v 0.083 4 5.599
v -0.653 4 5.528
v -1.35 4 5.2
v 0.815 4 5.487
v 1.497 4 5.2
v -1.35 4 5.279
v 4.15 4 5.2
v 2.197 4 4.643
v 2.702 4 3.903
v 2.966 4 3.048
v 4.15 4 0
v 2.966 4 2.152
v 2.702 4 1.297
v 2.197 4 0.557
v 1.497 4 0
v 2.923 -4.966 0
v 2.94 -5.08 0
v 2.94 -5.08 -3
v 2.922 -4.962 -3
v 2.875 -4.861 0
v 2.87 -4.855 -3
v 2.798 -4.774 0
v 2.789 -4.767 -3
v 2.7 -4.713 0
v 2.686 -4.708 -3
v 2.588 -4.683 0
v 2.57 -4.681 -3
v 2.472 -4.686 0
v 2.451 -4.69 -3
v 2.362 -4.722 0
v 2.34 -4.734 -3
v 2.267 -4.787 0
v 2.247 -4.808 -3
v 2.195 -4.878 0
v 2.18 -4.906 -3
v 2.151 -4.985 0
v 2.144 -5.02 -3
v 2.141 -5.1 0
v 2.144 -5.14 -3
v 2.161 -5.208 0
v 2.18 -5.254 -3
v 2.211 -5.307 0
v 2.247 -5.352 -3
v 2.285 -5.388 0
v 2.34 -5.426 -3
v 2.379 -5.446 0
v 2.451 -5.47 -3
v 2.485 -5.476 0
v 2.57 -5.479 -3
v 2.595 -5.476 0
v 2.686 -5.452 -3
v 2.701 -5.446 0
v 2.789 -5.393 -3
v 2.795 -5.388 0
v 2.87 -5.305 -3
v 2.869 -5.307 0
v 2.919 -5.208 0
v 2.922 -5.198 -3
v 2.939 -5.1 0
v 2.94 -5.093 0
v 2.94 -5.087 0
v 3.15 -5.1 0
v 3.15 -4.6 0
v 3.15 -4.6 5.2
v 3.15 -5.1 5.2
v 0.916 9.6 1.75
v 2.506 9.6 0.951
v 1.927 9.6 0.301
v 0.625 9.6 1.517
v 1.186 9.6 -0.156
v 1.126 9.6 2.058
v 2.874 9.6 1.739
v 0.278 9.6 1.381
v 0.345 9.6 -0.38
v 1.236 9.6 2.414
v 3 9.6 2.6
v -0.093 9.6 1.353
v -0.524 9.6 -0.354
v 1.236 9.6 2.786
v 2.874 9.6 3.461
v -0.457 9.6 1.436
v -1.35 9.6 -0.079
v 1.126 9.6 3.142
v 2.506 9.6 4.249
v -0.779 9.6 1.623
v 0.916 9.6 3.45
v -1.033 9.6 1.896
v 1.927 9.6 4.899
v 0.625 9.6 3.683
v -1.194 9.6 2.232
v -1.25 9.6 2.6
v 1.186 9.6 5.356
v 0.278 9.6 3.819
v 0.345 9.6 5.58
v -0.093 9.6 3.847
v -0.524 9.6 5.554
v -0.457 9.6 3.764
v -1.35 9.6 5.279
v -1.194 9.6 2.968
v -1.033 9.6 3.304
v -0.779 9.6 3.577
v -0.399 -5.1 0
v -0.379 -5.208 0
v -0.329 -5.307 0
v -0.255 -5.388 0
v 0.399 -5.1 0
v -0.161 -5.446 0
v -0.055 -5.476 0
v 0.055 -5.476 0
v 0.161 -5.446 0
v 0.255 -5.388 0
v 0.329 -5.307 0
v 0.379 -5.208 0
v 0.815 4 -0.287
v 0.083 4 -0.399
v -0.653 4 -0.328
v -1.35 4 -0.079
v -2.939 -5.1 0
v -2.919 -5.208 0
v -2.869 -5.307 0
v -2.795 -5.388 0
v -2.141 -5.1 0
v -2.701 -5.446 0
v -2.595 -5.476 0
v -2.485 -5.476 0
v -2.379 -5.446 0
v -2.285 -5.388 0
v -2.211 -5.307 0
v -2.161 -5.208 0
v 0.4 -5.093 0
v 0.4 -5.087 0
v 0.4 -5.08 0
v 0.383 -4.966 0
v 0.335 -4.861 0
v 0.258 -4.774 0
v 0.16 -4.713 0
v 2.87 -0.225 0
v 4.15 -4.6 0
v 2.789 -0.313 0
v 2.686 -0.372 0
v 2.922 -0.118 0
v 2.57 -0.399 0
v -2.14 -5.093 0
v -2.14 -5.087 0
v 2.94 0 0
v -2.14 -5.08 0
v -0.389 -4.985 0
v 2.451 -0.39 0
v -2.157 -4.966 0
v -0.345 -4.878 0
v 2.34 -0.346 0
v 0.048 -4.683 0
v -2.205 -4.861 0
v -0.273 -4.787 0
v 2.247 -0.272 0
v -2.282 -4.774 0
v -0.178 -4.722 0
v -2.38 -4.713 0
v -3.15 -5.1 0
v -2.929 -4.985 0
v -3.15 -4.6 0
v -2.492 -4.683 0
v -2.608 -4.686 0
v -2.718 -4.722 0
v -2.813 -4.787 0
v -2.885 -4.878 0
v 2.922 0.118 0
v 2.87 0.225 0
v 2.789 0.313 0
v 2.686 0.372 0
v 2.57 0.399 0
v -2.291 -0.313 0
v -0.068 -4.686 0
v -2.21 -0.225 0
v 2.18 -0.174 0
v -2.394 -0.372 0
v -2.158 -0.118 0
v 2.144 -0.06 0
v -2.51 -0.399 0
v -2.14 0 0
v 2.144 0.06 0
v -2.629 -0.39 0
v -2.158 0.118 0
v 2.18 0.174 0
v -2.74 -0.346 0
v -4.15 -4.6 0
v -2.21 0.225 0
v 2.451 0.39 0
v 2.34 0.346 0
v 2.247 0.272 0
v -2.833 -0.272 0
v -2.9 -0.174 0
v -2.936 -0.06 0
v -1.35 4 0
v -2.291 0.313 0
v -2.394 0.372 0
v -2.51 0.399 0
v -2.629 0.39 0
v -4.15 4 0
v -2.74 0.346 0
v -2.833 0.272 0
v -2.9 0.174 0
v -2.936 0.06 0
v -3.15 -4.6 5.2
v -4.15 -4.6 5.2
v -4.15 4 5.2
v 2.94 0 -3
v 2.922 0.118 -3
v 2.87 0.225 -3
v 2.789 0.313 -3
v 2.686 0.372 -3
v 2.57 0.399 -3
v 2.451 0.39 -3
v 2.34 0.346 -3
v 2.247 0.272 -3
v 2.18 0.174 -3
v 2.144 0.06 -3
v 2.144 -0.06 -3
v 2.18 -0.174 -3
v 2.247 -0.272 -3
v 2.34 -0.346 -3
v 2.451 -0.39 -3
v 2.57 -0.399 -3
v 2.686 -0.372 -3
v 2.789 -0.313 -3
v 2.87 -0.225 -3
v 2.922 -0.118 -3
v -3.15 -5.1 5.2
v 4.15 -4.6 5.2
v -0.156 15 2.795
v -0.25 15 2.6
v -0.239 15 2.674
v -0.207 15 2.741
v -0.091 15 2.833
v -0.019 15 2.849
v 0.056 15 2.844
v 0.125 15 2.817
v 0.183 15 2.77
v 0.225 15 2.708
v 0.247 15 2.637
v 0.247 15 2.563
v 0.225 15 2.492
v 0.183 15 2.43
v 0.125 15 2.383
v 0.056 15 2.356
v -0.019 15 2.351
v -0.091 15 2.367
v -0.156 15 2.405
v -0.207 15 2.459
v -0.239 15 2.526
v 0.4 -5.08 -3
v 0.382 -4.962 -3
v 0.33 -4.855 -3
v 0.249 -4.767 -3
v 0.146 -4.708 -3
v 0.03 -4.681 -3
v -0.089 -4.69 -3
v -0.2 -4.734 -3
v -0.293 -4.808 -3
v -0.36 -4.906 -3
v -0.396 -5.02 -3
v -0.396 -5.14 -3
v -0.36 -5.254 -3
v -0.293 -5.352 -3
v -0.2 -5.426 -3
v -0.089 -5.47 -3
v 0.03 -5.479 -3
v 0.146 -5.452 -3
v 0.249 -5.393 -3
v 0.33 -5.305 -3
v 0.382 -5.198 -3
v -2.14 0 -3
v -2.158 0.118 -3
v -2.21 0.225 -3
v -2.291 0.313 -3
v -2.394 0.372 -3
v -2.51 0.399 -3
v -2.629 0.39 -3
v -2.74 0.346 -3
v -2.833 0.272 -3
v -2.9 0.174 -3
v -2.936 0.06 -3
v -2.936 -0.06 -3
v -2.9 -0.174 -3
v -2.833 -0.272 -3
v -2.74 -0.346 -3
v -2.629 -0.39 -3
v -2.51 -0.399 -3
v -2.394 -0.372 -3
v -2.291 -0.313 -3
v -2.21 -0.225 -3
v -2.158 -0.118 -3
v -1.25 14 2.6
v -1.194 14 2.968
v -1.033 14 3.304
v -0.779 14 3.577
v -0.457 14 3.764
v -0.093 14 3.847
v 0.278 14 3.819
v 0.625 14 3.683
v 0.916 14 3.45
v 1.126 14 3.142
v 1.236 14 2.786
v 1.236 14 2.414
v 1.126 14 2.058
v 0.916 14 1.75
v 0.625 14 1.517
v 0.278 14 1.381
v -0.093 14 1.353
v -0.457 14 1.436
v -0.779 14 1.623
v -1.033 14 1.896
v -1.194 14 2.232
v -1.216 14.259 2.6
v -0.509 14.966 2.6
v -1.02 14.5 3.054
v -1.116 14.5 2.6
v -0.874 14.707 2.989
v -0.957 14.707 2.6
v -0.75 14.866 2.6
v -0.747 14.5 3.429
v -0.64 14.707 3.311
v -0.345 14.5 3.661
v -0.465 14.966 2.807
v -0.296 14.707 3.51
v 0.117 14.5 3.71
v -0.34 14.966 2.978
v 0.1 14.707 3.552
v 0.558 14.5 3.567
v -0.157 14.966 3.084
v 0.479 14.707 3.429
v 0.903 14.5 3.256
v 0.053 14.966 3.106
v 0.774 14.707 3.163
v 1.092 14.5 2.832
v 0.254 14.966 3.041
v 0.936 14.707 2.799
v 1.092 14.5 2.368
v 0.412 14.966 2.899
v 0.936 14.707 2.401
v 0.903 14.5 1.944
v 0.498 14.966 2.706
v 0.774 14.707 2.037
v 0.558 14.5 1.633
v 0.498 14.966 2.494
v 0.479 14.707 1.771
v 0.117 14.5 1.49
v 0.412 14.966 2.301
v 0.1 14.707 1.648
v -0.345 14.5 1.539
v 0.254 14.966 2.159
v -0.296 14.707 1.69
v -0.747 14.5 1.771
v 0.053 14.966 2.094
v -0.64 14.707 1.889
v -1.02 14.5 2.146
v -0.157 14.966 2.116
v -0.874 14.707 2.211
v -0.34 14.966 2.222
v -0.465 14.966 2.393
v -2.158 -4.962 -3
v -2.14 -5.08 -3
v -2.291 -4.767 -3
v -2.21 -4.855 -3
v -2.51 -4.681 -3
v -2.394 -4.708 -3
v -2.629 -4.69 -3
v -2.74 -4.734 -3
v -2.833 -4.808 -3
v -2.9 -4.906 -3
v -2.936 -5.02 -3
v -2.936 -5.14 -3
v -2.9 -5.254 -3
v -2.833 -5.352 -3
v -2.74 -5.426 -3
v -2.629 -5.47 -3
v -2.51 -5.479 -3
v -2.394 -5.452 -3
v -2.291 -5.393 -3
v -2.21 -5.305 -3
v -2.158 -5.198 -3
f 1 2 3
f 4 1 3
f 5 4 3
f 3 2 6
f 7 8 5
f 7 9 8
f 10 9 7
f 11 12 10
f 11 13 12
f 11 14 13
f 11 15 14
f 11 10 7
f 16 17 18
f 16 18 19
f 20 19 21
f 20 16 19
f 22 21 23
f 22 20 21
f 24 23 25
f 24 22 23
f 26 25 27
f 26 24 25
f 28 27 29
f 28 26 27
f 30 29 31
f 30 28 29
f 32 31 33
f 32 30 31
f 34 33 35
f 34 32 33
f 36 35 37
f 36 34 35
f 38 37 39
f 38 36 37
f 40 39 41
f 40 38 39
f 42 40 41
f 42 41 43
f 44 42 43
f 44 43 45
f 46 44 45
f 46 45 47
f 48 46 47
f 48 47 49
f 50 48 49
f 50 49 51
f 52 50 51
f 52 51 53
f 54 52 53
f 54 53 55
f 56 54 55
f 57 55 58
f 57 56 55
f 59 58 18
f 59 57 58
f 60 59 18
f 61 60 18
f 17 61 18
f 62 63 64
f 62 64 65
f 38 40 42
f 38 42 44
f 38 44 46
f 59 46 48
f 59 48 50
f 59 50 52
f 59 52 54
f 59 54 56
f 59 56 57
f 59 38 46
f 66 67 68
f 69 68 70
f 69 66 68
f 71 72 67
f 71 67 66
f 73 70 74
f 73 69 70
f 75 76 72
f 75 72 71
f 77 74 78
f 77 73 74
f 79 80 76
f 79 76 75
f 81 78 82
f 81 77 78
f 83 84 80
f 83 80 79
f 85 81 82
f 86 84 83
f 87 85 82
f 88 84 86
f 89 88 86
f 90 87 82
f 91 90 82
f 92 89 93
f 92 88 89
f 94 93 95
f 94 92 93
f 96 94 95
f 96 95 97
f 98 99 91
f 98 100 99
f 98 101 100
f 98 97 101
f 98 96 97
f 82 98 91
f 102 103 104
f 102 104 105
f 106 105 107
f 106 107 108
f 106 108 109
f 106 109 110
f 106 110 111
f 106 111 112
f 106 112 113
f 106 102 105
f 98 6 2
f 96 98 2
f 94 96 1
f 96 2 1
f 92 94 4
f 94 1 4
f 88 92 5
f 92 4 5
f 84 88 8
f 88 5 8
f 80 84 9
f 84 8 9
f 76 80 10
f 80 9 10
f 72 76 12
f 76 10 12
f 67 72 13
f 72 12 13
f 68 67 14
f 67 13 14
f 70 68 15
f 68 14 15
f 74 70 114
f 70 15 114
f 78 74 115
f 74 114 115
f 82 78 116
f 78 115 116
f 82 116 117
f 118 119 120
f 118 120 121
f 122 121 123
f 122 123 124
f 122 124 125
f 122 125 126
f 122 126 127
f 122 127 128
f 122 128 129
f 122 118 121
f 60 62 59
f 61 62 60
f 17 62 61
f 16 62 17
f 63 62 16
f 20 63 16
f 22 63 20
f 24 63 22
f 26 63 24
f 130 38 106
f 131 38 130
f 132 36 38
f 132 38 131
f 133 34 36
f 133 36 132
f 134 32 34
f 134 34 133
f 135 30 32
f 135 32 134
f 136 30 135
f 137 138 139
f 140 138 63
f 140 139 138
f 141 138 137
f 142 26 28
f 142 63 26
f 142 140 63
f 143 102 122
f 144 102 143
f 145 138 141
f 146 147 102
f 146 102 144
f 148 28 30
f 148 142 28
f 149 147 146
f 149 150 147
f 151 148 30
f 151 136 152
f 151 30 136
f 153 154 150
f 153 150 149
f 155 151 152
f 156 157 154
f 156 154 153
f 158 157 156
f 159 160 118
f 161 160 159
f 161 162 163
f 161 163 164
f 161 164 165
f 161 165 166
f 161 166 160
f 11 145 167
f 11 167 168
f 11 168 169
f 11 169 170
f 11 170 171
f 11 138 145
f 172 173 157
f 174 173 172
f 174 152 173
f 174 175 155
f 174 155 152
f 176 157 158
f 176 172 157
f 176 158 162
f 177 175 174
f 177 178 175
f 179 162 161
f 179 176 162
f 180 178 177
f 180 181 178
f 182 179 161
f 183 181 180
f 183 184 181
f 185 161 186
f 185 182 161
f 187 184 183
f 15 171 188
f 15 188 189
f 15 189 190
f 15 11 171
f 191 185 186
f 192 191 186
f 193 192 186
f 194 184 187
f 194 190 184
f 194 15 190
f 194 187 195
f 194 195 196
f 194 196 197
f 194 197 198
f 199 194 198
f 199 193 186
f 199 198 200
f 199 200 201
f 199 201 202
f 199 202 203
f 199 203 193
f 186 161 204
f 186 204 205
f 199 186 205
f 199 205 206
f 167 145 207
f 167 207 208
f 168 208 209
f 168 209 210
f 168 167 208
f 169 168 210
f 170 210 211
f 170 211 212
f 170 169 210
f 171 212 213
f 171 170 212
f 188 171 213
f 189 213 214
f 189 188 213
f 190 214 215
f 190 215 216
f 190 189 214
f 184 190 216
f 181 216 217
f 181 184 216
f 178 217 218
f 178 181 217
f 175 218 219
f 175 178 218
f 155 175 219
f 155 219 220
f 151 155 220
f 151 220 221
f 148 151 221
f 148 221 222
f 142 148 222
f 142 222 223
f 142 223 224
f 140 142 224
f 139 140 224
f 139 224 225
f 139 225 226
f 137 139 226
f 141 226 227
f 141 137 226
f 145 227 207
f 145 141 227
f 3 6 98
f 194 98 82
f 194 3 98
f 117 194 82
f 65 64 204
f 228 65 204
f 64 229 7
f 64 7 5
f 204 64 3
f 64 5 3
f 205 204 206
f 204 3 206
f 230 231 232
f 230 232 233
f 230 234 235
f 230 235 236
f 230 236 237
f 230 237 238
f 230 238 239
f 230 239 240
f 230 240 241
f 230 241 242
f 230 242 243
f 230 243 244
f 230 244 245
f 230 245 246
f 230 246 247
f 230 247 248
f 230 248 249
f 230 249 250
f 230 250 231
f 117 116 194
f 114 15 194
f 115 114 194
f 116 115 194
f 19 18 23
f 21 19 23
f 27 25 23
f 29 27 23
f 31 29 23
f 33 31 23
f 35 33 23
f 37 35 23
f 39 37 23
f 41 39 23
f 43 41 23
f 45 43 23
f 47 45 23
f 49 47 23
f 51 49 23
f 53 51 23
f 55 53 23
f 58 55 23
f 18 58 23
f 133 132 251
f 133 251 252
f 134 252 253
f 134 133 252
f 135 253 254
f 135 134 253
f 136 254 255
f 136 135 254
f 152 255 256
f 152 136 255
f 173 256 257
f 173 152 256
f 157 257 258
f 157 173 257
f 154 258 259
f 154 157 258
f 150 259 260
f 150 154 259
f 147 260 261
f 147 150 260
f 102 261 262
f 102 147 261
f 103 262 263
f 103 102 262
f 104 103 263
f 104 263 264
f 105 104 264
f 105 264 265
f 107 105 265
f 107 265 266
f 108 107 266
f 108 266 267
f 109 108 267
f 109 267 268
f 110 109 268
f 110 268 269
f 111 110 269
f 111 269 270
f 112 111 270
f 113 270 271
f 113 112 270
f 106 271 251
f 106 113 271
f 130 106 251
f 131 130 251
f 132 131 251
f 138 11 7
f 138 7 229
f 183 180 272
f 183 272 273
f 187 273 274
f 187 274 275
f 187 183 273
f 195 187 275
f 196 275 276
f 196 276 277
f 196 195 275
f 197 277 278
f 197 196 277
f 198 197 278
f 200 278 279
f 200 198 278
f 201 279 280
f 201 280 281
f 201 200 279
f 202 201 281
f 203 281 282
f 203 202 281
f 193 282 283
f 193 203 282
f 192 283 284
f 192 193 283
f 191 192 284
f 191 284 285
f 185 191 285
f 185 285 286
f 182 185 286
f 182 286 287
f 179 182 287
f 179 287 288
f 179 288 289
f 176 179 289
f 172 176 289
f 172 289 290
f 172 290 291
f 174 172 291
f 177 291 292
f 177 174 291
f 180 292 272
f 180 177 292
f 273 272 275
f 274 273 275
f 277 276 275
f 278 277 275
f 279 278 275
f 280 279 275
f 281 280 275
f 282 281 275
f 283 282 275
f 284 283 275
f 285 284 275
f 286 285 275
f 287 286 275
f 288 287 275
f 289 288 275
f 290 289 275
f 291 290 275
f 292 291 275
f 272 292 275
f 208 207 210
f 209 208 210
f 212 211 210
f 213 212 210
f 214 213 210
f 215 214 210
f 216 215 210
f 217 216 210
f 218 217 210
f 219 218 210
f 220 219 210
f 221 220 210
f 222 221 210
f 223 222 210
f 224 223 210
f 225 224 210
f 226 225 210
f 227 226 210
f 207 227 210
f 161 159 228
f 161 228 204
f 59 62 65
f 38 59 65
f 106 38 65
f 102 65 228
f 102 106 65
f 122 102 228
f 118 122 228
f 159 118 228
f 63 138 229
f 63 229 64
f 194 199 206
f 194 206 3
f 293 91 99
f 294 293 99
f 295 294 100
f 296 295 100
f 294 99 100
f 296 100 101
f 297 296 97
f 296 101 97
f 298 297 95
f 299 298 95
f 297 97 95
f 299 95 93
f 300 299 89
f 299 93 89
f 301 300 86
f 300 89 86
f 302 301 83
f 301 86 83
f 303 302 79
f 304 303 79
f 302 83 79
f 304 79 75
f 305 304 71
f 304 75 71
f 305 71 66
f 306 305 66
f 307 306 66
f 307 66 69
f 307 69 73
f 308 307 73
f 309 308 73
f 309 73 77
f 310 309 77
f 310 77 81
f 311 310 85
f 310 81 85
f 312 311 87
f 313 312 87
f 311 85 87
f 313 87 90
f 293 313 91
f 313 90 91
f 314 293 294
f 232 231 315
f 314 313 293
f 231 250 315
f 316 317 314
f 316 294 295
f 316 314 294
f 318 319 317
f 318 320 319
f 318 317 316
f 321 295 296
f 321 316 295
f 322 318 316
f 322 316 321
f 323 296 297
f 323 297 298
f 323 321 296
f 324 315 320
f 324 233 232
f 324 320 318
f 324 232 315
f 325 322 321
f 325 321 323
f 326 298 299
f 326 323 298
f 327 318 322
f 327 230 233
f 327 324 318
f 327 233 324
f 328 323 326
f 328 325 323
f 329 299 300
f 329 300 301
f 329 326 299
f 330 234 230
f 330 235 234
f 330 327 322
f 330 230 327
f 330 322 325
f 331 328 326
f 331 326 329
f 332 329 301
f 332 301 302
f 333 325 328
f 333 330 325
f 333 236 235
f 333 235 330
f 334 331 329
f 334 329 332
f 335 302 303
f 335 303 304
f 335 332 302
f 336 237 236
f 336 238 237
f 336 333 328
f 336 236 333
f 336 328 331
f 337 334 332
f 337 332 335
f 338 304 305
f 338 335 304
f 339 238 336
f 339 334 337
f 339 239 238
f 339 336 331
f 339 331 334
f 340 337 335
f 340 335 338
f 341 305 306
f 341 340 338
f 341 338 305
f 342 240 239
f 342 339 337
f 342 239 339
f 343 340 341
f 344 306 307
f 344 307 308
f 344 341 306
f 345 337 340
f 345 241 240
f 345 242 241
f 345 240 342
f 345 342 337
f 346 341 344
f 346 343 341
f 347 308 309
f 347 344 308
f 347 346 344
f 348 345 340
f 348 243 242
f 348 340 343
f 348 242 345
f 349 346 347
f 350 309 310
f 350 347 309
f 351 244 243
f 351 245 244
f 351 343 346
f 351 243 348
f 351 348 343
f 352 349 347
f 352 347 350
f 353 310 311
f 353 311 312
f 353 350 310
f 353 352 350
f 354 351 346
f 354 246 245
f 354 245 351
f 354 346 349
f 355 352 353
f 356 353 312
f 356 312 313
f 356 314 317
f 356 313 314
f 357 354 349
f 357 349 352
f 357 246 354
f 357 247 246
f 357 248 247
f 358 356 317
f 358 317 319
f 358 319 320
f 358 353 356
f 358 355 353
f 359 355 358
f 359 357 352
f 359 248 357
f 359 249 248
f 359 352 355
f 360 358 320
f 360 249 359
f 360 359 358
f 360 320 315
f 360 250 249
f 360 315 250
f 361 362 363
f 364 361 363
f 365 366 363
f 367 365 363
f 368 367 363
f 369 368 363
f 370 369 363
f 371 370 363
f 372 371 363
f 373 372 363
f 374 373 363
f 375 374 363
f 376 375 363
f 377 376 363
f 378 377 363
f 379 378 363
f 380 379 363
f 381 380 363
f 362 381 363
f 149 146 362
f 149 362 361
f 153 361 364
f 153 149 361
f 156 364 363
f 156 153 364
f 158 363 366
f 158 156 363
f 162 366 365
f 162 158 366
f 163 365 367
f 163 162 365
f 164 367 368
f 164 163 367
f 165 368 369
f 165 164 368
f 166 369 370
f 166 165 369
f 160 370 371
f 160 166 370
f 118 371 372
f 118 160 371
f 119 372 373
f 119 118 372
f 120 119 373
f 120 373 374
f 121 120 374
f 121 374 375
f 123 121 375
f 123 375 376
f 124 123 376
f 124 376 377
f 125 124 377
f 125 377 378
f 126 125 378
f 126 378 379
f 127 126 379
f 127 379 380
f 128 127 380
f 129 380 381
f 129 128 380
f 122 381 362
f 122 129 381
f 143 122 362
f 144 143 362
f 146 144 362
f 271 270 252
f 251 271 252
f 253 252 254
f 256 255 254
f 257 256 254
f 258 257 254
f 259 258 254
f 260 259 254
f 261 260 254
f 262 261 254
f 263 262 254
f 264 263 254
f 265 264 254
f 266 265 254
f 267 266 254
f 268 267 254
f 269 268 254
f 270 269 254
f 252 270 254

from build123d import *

# Parameters (mm, degrees)
PAD_DEPTH    = 5.2
SKETCH001_R  = 0.4
PAD001_DEPTH = 3
PAD002_DEPTH = 5.6
SKETCH003_R  = 1.25
PAD003_DEPTH = 5.4
FILLET_R     = 1


with BuildPart() as part:
    # Sketch → Pad (new body)
    with BuildSketch(Plane.XY):
        Polygon((-4.15, 4), (4.15, 4), (4.15, -4.6), (3.15, -4.6), (3.15, -5.1), (-3.15, -5.1), (-3.15, -4.6), (-4.15, -4.6), align=None)
    extrude(amount=PAD_DEPTH)

    # Sketch001 → Pad001 (join)
    with BuildSketch(Plane.XY):
        with Locations((-2.54, 0)):
            Circle(SKETCH001_R)
        with Locations((2.54, 0)):
            Circle(SKETCH001_R)
        with Locations((-2.54, -5.08)):
            Circle(SKETCH001_R)
        with Locations((2.54, -5.08)):
            Circle(SKETCH001_R)
        with Locations((0, -5.08)):
            Circle(SKETCH001_R)
    extrude(amount=-PAD001_DEPTH)

    # Sketch002 (on DatumPlane) → Pad002 (join)
    with BuildSketch(Plane(origin=(0, 4, 0), x_dir=(-1, 0, 0), z_dir=(0, 1, 0))):
        with BuildLine():
            ThreePointArc((1.35, 5.279086), (-3, 2.6), (1.35, -0.079086))
            Line((1.35, 5.279086), (1.35, -0.079086))
        make_face()
    extrude(amount=PAD002_DEPTH)

    # Sketch003 (on DatumPlane) → Pad003 (join)
    with BuildSketch(Plane(origin=(0, 9.6, 0), x_dir=(-1, 0, 0), z_dir=(0, 1, 0))):
        with Locations((0, 2.6)):
            Circle(SKETCH003_R)
    extrude(amount=PAD003_DEPTH)

    # Fillet
    fillet_edges = [part.edges().sort_by_distance(p)[0] for p in [
        (1.25, 15, 2.6),
    ]]
    fillet(fillet_edges, radius=FILLET_R)


solid = part.part
